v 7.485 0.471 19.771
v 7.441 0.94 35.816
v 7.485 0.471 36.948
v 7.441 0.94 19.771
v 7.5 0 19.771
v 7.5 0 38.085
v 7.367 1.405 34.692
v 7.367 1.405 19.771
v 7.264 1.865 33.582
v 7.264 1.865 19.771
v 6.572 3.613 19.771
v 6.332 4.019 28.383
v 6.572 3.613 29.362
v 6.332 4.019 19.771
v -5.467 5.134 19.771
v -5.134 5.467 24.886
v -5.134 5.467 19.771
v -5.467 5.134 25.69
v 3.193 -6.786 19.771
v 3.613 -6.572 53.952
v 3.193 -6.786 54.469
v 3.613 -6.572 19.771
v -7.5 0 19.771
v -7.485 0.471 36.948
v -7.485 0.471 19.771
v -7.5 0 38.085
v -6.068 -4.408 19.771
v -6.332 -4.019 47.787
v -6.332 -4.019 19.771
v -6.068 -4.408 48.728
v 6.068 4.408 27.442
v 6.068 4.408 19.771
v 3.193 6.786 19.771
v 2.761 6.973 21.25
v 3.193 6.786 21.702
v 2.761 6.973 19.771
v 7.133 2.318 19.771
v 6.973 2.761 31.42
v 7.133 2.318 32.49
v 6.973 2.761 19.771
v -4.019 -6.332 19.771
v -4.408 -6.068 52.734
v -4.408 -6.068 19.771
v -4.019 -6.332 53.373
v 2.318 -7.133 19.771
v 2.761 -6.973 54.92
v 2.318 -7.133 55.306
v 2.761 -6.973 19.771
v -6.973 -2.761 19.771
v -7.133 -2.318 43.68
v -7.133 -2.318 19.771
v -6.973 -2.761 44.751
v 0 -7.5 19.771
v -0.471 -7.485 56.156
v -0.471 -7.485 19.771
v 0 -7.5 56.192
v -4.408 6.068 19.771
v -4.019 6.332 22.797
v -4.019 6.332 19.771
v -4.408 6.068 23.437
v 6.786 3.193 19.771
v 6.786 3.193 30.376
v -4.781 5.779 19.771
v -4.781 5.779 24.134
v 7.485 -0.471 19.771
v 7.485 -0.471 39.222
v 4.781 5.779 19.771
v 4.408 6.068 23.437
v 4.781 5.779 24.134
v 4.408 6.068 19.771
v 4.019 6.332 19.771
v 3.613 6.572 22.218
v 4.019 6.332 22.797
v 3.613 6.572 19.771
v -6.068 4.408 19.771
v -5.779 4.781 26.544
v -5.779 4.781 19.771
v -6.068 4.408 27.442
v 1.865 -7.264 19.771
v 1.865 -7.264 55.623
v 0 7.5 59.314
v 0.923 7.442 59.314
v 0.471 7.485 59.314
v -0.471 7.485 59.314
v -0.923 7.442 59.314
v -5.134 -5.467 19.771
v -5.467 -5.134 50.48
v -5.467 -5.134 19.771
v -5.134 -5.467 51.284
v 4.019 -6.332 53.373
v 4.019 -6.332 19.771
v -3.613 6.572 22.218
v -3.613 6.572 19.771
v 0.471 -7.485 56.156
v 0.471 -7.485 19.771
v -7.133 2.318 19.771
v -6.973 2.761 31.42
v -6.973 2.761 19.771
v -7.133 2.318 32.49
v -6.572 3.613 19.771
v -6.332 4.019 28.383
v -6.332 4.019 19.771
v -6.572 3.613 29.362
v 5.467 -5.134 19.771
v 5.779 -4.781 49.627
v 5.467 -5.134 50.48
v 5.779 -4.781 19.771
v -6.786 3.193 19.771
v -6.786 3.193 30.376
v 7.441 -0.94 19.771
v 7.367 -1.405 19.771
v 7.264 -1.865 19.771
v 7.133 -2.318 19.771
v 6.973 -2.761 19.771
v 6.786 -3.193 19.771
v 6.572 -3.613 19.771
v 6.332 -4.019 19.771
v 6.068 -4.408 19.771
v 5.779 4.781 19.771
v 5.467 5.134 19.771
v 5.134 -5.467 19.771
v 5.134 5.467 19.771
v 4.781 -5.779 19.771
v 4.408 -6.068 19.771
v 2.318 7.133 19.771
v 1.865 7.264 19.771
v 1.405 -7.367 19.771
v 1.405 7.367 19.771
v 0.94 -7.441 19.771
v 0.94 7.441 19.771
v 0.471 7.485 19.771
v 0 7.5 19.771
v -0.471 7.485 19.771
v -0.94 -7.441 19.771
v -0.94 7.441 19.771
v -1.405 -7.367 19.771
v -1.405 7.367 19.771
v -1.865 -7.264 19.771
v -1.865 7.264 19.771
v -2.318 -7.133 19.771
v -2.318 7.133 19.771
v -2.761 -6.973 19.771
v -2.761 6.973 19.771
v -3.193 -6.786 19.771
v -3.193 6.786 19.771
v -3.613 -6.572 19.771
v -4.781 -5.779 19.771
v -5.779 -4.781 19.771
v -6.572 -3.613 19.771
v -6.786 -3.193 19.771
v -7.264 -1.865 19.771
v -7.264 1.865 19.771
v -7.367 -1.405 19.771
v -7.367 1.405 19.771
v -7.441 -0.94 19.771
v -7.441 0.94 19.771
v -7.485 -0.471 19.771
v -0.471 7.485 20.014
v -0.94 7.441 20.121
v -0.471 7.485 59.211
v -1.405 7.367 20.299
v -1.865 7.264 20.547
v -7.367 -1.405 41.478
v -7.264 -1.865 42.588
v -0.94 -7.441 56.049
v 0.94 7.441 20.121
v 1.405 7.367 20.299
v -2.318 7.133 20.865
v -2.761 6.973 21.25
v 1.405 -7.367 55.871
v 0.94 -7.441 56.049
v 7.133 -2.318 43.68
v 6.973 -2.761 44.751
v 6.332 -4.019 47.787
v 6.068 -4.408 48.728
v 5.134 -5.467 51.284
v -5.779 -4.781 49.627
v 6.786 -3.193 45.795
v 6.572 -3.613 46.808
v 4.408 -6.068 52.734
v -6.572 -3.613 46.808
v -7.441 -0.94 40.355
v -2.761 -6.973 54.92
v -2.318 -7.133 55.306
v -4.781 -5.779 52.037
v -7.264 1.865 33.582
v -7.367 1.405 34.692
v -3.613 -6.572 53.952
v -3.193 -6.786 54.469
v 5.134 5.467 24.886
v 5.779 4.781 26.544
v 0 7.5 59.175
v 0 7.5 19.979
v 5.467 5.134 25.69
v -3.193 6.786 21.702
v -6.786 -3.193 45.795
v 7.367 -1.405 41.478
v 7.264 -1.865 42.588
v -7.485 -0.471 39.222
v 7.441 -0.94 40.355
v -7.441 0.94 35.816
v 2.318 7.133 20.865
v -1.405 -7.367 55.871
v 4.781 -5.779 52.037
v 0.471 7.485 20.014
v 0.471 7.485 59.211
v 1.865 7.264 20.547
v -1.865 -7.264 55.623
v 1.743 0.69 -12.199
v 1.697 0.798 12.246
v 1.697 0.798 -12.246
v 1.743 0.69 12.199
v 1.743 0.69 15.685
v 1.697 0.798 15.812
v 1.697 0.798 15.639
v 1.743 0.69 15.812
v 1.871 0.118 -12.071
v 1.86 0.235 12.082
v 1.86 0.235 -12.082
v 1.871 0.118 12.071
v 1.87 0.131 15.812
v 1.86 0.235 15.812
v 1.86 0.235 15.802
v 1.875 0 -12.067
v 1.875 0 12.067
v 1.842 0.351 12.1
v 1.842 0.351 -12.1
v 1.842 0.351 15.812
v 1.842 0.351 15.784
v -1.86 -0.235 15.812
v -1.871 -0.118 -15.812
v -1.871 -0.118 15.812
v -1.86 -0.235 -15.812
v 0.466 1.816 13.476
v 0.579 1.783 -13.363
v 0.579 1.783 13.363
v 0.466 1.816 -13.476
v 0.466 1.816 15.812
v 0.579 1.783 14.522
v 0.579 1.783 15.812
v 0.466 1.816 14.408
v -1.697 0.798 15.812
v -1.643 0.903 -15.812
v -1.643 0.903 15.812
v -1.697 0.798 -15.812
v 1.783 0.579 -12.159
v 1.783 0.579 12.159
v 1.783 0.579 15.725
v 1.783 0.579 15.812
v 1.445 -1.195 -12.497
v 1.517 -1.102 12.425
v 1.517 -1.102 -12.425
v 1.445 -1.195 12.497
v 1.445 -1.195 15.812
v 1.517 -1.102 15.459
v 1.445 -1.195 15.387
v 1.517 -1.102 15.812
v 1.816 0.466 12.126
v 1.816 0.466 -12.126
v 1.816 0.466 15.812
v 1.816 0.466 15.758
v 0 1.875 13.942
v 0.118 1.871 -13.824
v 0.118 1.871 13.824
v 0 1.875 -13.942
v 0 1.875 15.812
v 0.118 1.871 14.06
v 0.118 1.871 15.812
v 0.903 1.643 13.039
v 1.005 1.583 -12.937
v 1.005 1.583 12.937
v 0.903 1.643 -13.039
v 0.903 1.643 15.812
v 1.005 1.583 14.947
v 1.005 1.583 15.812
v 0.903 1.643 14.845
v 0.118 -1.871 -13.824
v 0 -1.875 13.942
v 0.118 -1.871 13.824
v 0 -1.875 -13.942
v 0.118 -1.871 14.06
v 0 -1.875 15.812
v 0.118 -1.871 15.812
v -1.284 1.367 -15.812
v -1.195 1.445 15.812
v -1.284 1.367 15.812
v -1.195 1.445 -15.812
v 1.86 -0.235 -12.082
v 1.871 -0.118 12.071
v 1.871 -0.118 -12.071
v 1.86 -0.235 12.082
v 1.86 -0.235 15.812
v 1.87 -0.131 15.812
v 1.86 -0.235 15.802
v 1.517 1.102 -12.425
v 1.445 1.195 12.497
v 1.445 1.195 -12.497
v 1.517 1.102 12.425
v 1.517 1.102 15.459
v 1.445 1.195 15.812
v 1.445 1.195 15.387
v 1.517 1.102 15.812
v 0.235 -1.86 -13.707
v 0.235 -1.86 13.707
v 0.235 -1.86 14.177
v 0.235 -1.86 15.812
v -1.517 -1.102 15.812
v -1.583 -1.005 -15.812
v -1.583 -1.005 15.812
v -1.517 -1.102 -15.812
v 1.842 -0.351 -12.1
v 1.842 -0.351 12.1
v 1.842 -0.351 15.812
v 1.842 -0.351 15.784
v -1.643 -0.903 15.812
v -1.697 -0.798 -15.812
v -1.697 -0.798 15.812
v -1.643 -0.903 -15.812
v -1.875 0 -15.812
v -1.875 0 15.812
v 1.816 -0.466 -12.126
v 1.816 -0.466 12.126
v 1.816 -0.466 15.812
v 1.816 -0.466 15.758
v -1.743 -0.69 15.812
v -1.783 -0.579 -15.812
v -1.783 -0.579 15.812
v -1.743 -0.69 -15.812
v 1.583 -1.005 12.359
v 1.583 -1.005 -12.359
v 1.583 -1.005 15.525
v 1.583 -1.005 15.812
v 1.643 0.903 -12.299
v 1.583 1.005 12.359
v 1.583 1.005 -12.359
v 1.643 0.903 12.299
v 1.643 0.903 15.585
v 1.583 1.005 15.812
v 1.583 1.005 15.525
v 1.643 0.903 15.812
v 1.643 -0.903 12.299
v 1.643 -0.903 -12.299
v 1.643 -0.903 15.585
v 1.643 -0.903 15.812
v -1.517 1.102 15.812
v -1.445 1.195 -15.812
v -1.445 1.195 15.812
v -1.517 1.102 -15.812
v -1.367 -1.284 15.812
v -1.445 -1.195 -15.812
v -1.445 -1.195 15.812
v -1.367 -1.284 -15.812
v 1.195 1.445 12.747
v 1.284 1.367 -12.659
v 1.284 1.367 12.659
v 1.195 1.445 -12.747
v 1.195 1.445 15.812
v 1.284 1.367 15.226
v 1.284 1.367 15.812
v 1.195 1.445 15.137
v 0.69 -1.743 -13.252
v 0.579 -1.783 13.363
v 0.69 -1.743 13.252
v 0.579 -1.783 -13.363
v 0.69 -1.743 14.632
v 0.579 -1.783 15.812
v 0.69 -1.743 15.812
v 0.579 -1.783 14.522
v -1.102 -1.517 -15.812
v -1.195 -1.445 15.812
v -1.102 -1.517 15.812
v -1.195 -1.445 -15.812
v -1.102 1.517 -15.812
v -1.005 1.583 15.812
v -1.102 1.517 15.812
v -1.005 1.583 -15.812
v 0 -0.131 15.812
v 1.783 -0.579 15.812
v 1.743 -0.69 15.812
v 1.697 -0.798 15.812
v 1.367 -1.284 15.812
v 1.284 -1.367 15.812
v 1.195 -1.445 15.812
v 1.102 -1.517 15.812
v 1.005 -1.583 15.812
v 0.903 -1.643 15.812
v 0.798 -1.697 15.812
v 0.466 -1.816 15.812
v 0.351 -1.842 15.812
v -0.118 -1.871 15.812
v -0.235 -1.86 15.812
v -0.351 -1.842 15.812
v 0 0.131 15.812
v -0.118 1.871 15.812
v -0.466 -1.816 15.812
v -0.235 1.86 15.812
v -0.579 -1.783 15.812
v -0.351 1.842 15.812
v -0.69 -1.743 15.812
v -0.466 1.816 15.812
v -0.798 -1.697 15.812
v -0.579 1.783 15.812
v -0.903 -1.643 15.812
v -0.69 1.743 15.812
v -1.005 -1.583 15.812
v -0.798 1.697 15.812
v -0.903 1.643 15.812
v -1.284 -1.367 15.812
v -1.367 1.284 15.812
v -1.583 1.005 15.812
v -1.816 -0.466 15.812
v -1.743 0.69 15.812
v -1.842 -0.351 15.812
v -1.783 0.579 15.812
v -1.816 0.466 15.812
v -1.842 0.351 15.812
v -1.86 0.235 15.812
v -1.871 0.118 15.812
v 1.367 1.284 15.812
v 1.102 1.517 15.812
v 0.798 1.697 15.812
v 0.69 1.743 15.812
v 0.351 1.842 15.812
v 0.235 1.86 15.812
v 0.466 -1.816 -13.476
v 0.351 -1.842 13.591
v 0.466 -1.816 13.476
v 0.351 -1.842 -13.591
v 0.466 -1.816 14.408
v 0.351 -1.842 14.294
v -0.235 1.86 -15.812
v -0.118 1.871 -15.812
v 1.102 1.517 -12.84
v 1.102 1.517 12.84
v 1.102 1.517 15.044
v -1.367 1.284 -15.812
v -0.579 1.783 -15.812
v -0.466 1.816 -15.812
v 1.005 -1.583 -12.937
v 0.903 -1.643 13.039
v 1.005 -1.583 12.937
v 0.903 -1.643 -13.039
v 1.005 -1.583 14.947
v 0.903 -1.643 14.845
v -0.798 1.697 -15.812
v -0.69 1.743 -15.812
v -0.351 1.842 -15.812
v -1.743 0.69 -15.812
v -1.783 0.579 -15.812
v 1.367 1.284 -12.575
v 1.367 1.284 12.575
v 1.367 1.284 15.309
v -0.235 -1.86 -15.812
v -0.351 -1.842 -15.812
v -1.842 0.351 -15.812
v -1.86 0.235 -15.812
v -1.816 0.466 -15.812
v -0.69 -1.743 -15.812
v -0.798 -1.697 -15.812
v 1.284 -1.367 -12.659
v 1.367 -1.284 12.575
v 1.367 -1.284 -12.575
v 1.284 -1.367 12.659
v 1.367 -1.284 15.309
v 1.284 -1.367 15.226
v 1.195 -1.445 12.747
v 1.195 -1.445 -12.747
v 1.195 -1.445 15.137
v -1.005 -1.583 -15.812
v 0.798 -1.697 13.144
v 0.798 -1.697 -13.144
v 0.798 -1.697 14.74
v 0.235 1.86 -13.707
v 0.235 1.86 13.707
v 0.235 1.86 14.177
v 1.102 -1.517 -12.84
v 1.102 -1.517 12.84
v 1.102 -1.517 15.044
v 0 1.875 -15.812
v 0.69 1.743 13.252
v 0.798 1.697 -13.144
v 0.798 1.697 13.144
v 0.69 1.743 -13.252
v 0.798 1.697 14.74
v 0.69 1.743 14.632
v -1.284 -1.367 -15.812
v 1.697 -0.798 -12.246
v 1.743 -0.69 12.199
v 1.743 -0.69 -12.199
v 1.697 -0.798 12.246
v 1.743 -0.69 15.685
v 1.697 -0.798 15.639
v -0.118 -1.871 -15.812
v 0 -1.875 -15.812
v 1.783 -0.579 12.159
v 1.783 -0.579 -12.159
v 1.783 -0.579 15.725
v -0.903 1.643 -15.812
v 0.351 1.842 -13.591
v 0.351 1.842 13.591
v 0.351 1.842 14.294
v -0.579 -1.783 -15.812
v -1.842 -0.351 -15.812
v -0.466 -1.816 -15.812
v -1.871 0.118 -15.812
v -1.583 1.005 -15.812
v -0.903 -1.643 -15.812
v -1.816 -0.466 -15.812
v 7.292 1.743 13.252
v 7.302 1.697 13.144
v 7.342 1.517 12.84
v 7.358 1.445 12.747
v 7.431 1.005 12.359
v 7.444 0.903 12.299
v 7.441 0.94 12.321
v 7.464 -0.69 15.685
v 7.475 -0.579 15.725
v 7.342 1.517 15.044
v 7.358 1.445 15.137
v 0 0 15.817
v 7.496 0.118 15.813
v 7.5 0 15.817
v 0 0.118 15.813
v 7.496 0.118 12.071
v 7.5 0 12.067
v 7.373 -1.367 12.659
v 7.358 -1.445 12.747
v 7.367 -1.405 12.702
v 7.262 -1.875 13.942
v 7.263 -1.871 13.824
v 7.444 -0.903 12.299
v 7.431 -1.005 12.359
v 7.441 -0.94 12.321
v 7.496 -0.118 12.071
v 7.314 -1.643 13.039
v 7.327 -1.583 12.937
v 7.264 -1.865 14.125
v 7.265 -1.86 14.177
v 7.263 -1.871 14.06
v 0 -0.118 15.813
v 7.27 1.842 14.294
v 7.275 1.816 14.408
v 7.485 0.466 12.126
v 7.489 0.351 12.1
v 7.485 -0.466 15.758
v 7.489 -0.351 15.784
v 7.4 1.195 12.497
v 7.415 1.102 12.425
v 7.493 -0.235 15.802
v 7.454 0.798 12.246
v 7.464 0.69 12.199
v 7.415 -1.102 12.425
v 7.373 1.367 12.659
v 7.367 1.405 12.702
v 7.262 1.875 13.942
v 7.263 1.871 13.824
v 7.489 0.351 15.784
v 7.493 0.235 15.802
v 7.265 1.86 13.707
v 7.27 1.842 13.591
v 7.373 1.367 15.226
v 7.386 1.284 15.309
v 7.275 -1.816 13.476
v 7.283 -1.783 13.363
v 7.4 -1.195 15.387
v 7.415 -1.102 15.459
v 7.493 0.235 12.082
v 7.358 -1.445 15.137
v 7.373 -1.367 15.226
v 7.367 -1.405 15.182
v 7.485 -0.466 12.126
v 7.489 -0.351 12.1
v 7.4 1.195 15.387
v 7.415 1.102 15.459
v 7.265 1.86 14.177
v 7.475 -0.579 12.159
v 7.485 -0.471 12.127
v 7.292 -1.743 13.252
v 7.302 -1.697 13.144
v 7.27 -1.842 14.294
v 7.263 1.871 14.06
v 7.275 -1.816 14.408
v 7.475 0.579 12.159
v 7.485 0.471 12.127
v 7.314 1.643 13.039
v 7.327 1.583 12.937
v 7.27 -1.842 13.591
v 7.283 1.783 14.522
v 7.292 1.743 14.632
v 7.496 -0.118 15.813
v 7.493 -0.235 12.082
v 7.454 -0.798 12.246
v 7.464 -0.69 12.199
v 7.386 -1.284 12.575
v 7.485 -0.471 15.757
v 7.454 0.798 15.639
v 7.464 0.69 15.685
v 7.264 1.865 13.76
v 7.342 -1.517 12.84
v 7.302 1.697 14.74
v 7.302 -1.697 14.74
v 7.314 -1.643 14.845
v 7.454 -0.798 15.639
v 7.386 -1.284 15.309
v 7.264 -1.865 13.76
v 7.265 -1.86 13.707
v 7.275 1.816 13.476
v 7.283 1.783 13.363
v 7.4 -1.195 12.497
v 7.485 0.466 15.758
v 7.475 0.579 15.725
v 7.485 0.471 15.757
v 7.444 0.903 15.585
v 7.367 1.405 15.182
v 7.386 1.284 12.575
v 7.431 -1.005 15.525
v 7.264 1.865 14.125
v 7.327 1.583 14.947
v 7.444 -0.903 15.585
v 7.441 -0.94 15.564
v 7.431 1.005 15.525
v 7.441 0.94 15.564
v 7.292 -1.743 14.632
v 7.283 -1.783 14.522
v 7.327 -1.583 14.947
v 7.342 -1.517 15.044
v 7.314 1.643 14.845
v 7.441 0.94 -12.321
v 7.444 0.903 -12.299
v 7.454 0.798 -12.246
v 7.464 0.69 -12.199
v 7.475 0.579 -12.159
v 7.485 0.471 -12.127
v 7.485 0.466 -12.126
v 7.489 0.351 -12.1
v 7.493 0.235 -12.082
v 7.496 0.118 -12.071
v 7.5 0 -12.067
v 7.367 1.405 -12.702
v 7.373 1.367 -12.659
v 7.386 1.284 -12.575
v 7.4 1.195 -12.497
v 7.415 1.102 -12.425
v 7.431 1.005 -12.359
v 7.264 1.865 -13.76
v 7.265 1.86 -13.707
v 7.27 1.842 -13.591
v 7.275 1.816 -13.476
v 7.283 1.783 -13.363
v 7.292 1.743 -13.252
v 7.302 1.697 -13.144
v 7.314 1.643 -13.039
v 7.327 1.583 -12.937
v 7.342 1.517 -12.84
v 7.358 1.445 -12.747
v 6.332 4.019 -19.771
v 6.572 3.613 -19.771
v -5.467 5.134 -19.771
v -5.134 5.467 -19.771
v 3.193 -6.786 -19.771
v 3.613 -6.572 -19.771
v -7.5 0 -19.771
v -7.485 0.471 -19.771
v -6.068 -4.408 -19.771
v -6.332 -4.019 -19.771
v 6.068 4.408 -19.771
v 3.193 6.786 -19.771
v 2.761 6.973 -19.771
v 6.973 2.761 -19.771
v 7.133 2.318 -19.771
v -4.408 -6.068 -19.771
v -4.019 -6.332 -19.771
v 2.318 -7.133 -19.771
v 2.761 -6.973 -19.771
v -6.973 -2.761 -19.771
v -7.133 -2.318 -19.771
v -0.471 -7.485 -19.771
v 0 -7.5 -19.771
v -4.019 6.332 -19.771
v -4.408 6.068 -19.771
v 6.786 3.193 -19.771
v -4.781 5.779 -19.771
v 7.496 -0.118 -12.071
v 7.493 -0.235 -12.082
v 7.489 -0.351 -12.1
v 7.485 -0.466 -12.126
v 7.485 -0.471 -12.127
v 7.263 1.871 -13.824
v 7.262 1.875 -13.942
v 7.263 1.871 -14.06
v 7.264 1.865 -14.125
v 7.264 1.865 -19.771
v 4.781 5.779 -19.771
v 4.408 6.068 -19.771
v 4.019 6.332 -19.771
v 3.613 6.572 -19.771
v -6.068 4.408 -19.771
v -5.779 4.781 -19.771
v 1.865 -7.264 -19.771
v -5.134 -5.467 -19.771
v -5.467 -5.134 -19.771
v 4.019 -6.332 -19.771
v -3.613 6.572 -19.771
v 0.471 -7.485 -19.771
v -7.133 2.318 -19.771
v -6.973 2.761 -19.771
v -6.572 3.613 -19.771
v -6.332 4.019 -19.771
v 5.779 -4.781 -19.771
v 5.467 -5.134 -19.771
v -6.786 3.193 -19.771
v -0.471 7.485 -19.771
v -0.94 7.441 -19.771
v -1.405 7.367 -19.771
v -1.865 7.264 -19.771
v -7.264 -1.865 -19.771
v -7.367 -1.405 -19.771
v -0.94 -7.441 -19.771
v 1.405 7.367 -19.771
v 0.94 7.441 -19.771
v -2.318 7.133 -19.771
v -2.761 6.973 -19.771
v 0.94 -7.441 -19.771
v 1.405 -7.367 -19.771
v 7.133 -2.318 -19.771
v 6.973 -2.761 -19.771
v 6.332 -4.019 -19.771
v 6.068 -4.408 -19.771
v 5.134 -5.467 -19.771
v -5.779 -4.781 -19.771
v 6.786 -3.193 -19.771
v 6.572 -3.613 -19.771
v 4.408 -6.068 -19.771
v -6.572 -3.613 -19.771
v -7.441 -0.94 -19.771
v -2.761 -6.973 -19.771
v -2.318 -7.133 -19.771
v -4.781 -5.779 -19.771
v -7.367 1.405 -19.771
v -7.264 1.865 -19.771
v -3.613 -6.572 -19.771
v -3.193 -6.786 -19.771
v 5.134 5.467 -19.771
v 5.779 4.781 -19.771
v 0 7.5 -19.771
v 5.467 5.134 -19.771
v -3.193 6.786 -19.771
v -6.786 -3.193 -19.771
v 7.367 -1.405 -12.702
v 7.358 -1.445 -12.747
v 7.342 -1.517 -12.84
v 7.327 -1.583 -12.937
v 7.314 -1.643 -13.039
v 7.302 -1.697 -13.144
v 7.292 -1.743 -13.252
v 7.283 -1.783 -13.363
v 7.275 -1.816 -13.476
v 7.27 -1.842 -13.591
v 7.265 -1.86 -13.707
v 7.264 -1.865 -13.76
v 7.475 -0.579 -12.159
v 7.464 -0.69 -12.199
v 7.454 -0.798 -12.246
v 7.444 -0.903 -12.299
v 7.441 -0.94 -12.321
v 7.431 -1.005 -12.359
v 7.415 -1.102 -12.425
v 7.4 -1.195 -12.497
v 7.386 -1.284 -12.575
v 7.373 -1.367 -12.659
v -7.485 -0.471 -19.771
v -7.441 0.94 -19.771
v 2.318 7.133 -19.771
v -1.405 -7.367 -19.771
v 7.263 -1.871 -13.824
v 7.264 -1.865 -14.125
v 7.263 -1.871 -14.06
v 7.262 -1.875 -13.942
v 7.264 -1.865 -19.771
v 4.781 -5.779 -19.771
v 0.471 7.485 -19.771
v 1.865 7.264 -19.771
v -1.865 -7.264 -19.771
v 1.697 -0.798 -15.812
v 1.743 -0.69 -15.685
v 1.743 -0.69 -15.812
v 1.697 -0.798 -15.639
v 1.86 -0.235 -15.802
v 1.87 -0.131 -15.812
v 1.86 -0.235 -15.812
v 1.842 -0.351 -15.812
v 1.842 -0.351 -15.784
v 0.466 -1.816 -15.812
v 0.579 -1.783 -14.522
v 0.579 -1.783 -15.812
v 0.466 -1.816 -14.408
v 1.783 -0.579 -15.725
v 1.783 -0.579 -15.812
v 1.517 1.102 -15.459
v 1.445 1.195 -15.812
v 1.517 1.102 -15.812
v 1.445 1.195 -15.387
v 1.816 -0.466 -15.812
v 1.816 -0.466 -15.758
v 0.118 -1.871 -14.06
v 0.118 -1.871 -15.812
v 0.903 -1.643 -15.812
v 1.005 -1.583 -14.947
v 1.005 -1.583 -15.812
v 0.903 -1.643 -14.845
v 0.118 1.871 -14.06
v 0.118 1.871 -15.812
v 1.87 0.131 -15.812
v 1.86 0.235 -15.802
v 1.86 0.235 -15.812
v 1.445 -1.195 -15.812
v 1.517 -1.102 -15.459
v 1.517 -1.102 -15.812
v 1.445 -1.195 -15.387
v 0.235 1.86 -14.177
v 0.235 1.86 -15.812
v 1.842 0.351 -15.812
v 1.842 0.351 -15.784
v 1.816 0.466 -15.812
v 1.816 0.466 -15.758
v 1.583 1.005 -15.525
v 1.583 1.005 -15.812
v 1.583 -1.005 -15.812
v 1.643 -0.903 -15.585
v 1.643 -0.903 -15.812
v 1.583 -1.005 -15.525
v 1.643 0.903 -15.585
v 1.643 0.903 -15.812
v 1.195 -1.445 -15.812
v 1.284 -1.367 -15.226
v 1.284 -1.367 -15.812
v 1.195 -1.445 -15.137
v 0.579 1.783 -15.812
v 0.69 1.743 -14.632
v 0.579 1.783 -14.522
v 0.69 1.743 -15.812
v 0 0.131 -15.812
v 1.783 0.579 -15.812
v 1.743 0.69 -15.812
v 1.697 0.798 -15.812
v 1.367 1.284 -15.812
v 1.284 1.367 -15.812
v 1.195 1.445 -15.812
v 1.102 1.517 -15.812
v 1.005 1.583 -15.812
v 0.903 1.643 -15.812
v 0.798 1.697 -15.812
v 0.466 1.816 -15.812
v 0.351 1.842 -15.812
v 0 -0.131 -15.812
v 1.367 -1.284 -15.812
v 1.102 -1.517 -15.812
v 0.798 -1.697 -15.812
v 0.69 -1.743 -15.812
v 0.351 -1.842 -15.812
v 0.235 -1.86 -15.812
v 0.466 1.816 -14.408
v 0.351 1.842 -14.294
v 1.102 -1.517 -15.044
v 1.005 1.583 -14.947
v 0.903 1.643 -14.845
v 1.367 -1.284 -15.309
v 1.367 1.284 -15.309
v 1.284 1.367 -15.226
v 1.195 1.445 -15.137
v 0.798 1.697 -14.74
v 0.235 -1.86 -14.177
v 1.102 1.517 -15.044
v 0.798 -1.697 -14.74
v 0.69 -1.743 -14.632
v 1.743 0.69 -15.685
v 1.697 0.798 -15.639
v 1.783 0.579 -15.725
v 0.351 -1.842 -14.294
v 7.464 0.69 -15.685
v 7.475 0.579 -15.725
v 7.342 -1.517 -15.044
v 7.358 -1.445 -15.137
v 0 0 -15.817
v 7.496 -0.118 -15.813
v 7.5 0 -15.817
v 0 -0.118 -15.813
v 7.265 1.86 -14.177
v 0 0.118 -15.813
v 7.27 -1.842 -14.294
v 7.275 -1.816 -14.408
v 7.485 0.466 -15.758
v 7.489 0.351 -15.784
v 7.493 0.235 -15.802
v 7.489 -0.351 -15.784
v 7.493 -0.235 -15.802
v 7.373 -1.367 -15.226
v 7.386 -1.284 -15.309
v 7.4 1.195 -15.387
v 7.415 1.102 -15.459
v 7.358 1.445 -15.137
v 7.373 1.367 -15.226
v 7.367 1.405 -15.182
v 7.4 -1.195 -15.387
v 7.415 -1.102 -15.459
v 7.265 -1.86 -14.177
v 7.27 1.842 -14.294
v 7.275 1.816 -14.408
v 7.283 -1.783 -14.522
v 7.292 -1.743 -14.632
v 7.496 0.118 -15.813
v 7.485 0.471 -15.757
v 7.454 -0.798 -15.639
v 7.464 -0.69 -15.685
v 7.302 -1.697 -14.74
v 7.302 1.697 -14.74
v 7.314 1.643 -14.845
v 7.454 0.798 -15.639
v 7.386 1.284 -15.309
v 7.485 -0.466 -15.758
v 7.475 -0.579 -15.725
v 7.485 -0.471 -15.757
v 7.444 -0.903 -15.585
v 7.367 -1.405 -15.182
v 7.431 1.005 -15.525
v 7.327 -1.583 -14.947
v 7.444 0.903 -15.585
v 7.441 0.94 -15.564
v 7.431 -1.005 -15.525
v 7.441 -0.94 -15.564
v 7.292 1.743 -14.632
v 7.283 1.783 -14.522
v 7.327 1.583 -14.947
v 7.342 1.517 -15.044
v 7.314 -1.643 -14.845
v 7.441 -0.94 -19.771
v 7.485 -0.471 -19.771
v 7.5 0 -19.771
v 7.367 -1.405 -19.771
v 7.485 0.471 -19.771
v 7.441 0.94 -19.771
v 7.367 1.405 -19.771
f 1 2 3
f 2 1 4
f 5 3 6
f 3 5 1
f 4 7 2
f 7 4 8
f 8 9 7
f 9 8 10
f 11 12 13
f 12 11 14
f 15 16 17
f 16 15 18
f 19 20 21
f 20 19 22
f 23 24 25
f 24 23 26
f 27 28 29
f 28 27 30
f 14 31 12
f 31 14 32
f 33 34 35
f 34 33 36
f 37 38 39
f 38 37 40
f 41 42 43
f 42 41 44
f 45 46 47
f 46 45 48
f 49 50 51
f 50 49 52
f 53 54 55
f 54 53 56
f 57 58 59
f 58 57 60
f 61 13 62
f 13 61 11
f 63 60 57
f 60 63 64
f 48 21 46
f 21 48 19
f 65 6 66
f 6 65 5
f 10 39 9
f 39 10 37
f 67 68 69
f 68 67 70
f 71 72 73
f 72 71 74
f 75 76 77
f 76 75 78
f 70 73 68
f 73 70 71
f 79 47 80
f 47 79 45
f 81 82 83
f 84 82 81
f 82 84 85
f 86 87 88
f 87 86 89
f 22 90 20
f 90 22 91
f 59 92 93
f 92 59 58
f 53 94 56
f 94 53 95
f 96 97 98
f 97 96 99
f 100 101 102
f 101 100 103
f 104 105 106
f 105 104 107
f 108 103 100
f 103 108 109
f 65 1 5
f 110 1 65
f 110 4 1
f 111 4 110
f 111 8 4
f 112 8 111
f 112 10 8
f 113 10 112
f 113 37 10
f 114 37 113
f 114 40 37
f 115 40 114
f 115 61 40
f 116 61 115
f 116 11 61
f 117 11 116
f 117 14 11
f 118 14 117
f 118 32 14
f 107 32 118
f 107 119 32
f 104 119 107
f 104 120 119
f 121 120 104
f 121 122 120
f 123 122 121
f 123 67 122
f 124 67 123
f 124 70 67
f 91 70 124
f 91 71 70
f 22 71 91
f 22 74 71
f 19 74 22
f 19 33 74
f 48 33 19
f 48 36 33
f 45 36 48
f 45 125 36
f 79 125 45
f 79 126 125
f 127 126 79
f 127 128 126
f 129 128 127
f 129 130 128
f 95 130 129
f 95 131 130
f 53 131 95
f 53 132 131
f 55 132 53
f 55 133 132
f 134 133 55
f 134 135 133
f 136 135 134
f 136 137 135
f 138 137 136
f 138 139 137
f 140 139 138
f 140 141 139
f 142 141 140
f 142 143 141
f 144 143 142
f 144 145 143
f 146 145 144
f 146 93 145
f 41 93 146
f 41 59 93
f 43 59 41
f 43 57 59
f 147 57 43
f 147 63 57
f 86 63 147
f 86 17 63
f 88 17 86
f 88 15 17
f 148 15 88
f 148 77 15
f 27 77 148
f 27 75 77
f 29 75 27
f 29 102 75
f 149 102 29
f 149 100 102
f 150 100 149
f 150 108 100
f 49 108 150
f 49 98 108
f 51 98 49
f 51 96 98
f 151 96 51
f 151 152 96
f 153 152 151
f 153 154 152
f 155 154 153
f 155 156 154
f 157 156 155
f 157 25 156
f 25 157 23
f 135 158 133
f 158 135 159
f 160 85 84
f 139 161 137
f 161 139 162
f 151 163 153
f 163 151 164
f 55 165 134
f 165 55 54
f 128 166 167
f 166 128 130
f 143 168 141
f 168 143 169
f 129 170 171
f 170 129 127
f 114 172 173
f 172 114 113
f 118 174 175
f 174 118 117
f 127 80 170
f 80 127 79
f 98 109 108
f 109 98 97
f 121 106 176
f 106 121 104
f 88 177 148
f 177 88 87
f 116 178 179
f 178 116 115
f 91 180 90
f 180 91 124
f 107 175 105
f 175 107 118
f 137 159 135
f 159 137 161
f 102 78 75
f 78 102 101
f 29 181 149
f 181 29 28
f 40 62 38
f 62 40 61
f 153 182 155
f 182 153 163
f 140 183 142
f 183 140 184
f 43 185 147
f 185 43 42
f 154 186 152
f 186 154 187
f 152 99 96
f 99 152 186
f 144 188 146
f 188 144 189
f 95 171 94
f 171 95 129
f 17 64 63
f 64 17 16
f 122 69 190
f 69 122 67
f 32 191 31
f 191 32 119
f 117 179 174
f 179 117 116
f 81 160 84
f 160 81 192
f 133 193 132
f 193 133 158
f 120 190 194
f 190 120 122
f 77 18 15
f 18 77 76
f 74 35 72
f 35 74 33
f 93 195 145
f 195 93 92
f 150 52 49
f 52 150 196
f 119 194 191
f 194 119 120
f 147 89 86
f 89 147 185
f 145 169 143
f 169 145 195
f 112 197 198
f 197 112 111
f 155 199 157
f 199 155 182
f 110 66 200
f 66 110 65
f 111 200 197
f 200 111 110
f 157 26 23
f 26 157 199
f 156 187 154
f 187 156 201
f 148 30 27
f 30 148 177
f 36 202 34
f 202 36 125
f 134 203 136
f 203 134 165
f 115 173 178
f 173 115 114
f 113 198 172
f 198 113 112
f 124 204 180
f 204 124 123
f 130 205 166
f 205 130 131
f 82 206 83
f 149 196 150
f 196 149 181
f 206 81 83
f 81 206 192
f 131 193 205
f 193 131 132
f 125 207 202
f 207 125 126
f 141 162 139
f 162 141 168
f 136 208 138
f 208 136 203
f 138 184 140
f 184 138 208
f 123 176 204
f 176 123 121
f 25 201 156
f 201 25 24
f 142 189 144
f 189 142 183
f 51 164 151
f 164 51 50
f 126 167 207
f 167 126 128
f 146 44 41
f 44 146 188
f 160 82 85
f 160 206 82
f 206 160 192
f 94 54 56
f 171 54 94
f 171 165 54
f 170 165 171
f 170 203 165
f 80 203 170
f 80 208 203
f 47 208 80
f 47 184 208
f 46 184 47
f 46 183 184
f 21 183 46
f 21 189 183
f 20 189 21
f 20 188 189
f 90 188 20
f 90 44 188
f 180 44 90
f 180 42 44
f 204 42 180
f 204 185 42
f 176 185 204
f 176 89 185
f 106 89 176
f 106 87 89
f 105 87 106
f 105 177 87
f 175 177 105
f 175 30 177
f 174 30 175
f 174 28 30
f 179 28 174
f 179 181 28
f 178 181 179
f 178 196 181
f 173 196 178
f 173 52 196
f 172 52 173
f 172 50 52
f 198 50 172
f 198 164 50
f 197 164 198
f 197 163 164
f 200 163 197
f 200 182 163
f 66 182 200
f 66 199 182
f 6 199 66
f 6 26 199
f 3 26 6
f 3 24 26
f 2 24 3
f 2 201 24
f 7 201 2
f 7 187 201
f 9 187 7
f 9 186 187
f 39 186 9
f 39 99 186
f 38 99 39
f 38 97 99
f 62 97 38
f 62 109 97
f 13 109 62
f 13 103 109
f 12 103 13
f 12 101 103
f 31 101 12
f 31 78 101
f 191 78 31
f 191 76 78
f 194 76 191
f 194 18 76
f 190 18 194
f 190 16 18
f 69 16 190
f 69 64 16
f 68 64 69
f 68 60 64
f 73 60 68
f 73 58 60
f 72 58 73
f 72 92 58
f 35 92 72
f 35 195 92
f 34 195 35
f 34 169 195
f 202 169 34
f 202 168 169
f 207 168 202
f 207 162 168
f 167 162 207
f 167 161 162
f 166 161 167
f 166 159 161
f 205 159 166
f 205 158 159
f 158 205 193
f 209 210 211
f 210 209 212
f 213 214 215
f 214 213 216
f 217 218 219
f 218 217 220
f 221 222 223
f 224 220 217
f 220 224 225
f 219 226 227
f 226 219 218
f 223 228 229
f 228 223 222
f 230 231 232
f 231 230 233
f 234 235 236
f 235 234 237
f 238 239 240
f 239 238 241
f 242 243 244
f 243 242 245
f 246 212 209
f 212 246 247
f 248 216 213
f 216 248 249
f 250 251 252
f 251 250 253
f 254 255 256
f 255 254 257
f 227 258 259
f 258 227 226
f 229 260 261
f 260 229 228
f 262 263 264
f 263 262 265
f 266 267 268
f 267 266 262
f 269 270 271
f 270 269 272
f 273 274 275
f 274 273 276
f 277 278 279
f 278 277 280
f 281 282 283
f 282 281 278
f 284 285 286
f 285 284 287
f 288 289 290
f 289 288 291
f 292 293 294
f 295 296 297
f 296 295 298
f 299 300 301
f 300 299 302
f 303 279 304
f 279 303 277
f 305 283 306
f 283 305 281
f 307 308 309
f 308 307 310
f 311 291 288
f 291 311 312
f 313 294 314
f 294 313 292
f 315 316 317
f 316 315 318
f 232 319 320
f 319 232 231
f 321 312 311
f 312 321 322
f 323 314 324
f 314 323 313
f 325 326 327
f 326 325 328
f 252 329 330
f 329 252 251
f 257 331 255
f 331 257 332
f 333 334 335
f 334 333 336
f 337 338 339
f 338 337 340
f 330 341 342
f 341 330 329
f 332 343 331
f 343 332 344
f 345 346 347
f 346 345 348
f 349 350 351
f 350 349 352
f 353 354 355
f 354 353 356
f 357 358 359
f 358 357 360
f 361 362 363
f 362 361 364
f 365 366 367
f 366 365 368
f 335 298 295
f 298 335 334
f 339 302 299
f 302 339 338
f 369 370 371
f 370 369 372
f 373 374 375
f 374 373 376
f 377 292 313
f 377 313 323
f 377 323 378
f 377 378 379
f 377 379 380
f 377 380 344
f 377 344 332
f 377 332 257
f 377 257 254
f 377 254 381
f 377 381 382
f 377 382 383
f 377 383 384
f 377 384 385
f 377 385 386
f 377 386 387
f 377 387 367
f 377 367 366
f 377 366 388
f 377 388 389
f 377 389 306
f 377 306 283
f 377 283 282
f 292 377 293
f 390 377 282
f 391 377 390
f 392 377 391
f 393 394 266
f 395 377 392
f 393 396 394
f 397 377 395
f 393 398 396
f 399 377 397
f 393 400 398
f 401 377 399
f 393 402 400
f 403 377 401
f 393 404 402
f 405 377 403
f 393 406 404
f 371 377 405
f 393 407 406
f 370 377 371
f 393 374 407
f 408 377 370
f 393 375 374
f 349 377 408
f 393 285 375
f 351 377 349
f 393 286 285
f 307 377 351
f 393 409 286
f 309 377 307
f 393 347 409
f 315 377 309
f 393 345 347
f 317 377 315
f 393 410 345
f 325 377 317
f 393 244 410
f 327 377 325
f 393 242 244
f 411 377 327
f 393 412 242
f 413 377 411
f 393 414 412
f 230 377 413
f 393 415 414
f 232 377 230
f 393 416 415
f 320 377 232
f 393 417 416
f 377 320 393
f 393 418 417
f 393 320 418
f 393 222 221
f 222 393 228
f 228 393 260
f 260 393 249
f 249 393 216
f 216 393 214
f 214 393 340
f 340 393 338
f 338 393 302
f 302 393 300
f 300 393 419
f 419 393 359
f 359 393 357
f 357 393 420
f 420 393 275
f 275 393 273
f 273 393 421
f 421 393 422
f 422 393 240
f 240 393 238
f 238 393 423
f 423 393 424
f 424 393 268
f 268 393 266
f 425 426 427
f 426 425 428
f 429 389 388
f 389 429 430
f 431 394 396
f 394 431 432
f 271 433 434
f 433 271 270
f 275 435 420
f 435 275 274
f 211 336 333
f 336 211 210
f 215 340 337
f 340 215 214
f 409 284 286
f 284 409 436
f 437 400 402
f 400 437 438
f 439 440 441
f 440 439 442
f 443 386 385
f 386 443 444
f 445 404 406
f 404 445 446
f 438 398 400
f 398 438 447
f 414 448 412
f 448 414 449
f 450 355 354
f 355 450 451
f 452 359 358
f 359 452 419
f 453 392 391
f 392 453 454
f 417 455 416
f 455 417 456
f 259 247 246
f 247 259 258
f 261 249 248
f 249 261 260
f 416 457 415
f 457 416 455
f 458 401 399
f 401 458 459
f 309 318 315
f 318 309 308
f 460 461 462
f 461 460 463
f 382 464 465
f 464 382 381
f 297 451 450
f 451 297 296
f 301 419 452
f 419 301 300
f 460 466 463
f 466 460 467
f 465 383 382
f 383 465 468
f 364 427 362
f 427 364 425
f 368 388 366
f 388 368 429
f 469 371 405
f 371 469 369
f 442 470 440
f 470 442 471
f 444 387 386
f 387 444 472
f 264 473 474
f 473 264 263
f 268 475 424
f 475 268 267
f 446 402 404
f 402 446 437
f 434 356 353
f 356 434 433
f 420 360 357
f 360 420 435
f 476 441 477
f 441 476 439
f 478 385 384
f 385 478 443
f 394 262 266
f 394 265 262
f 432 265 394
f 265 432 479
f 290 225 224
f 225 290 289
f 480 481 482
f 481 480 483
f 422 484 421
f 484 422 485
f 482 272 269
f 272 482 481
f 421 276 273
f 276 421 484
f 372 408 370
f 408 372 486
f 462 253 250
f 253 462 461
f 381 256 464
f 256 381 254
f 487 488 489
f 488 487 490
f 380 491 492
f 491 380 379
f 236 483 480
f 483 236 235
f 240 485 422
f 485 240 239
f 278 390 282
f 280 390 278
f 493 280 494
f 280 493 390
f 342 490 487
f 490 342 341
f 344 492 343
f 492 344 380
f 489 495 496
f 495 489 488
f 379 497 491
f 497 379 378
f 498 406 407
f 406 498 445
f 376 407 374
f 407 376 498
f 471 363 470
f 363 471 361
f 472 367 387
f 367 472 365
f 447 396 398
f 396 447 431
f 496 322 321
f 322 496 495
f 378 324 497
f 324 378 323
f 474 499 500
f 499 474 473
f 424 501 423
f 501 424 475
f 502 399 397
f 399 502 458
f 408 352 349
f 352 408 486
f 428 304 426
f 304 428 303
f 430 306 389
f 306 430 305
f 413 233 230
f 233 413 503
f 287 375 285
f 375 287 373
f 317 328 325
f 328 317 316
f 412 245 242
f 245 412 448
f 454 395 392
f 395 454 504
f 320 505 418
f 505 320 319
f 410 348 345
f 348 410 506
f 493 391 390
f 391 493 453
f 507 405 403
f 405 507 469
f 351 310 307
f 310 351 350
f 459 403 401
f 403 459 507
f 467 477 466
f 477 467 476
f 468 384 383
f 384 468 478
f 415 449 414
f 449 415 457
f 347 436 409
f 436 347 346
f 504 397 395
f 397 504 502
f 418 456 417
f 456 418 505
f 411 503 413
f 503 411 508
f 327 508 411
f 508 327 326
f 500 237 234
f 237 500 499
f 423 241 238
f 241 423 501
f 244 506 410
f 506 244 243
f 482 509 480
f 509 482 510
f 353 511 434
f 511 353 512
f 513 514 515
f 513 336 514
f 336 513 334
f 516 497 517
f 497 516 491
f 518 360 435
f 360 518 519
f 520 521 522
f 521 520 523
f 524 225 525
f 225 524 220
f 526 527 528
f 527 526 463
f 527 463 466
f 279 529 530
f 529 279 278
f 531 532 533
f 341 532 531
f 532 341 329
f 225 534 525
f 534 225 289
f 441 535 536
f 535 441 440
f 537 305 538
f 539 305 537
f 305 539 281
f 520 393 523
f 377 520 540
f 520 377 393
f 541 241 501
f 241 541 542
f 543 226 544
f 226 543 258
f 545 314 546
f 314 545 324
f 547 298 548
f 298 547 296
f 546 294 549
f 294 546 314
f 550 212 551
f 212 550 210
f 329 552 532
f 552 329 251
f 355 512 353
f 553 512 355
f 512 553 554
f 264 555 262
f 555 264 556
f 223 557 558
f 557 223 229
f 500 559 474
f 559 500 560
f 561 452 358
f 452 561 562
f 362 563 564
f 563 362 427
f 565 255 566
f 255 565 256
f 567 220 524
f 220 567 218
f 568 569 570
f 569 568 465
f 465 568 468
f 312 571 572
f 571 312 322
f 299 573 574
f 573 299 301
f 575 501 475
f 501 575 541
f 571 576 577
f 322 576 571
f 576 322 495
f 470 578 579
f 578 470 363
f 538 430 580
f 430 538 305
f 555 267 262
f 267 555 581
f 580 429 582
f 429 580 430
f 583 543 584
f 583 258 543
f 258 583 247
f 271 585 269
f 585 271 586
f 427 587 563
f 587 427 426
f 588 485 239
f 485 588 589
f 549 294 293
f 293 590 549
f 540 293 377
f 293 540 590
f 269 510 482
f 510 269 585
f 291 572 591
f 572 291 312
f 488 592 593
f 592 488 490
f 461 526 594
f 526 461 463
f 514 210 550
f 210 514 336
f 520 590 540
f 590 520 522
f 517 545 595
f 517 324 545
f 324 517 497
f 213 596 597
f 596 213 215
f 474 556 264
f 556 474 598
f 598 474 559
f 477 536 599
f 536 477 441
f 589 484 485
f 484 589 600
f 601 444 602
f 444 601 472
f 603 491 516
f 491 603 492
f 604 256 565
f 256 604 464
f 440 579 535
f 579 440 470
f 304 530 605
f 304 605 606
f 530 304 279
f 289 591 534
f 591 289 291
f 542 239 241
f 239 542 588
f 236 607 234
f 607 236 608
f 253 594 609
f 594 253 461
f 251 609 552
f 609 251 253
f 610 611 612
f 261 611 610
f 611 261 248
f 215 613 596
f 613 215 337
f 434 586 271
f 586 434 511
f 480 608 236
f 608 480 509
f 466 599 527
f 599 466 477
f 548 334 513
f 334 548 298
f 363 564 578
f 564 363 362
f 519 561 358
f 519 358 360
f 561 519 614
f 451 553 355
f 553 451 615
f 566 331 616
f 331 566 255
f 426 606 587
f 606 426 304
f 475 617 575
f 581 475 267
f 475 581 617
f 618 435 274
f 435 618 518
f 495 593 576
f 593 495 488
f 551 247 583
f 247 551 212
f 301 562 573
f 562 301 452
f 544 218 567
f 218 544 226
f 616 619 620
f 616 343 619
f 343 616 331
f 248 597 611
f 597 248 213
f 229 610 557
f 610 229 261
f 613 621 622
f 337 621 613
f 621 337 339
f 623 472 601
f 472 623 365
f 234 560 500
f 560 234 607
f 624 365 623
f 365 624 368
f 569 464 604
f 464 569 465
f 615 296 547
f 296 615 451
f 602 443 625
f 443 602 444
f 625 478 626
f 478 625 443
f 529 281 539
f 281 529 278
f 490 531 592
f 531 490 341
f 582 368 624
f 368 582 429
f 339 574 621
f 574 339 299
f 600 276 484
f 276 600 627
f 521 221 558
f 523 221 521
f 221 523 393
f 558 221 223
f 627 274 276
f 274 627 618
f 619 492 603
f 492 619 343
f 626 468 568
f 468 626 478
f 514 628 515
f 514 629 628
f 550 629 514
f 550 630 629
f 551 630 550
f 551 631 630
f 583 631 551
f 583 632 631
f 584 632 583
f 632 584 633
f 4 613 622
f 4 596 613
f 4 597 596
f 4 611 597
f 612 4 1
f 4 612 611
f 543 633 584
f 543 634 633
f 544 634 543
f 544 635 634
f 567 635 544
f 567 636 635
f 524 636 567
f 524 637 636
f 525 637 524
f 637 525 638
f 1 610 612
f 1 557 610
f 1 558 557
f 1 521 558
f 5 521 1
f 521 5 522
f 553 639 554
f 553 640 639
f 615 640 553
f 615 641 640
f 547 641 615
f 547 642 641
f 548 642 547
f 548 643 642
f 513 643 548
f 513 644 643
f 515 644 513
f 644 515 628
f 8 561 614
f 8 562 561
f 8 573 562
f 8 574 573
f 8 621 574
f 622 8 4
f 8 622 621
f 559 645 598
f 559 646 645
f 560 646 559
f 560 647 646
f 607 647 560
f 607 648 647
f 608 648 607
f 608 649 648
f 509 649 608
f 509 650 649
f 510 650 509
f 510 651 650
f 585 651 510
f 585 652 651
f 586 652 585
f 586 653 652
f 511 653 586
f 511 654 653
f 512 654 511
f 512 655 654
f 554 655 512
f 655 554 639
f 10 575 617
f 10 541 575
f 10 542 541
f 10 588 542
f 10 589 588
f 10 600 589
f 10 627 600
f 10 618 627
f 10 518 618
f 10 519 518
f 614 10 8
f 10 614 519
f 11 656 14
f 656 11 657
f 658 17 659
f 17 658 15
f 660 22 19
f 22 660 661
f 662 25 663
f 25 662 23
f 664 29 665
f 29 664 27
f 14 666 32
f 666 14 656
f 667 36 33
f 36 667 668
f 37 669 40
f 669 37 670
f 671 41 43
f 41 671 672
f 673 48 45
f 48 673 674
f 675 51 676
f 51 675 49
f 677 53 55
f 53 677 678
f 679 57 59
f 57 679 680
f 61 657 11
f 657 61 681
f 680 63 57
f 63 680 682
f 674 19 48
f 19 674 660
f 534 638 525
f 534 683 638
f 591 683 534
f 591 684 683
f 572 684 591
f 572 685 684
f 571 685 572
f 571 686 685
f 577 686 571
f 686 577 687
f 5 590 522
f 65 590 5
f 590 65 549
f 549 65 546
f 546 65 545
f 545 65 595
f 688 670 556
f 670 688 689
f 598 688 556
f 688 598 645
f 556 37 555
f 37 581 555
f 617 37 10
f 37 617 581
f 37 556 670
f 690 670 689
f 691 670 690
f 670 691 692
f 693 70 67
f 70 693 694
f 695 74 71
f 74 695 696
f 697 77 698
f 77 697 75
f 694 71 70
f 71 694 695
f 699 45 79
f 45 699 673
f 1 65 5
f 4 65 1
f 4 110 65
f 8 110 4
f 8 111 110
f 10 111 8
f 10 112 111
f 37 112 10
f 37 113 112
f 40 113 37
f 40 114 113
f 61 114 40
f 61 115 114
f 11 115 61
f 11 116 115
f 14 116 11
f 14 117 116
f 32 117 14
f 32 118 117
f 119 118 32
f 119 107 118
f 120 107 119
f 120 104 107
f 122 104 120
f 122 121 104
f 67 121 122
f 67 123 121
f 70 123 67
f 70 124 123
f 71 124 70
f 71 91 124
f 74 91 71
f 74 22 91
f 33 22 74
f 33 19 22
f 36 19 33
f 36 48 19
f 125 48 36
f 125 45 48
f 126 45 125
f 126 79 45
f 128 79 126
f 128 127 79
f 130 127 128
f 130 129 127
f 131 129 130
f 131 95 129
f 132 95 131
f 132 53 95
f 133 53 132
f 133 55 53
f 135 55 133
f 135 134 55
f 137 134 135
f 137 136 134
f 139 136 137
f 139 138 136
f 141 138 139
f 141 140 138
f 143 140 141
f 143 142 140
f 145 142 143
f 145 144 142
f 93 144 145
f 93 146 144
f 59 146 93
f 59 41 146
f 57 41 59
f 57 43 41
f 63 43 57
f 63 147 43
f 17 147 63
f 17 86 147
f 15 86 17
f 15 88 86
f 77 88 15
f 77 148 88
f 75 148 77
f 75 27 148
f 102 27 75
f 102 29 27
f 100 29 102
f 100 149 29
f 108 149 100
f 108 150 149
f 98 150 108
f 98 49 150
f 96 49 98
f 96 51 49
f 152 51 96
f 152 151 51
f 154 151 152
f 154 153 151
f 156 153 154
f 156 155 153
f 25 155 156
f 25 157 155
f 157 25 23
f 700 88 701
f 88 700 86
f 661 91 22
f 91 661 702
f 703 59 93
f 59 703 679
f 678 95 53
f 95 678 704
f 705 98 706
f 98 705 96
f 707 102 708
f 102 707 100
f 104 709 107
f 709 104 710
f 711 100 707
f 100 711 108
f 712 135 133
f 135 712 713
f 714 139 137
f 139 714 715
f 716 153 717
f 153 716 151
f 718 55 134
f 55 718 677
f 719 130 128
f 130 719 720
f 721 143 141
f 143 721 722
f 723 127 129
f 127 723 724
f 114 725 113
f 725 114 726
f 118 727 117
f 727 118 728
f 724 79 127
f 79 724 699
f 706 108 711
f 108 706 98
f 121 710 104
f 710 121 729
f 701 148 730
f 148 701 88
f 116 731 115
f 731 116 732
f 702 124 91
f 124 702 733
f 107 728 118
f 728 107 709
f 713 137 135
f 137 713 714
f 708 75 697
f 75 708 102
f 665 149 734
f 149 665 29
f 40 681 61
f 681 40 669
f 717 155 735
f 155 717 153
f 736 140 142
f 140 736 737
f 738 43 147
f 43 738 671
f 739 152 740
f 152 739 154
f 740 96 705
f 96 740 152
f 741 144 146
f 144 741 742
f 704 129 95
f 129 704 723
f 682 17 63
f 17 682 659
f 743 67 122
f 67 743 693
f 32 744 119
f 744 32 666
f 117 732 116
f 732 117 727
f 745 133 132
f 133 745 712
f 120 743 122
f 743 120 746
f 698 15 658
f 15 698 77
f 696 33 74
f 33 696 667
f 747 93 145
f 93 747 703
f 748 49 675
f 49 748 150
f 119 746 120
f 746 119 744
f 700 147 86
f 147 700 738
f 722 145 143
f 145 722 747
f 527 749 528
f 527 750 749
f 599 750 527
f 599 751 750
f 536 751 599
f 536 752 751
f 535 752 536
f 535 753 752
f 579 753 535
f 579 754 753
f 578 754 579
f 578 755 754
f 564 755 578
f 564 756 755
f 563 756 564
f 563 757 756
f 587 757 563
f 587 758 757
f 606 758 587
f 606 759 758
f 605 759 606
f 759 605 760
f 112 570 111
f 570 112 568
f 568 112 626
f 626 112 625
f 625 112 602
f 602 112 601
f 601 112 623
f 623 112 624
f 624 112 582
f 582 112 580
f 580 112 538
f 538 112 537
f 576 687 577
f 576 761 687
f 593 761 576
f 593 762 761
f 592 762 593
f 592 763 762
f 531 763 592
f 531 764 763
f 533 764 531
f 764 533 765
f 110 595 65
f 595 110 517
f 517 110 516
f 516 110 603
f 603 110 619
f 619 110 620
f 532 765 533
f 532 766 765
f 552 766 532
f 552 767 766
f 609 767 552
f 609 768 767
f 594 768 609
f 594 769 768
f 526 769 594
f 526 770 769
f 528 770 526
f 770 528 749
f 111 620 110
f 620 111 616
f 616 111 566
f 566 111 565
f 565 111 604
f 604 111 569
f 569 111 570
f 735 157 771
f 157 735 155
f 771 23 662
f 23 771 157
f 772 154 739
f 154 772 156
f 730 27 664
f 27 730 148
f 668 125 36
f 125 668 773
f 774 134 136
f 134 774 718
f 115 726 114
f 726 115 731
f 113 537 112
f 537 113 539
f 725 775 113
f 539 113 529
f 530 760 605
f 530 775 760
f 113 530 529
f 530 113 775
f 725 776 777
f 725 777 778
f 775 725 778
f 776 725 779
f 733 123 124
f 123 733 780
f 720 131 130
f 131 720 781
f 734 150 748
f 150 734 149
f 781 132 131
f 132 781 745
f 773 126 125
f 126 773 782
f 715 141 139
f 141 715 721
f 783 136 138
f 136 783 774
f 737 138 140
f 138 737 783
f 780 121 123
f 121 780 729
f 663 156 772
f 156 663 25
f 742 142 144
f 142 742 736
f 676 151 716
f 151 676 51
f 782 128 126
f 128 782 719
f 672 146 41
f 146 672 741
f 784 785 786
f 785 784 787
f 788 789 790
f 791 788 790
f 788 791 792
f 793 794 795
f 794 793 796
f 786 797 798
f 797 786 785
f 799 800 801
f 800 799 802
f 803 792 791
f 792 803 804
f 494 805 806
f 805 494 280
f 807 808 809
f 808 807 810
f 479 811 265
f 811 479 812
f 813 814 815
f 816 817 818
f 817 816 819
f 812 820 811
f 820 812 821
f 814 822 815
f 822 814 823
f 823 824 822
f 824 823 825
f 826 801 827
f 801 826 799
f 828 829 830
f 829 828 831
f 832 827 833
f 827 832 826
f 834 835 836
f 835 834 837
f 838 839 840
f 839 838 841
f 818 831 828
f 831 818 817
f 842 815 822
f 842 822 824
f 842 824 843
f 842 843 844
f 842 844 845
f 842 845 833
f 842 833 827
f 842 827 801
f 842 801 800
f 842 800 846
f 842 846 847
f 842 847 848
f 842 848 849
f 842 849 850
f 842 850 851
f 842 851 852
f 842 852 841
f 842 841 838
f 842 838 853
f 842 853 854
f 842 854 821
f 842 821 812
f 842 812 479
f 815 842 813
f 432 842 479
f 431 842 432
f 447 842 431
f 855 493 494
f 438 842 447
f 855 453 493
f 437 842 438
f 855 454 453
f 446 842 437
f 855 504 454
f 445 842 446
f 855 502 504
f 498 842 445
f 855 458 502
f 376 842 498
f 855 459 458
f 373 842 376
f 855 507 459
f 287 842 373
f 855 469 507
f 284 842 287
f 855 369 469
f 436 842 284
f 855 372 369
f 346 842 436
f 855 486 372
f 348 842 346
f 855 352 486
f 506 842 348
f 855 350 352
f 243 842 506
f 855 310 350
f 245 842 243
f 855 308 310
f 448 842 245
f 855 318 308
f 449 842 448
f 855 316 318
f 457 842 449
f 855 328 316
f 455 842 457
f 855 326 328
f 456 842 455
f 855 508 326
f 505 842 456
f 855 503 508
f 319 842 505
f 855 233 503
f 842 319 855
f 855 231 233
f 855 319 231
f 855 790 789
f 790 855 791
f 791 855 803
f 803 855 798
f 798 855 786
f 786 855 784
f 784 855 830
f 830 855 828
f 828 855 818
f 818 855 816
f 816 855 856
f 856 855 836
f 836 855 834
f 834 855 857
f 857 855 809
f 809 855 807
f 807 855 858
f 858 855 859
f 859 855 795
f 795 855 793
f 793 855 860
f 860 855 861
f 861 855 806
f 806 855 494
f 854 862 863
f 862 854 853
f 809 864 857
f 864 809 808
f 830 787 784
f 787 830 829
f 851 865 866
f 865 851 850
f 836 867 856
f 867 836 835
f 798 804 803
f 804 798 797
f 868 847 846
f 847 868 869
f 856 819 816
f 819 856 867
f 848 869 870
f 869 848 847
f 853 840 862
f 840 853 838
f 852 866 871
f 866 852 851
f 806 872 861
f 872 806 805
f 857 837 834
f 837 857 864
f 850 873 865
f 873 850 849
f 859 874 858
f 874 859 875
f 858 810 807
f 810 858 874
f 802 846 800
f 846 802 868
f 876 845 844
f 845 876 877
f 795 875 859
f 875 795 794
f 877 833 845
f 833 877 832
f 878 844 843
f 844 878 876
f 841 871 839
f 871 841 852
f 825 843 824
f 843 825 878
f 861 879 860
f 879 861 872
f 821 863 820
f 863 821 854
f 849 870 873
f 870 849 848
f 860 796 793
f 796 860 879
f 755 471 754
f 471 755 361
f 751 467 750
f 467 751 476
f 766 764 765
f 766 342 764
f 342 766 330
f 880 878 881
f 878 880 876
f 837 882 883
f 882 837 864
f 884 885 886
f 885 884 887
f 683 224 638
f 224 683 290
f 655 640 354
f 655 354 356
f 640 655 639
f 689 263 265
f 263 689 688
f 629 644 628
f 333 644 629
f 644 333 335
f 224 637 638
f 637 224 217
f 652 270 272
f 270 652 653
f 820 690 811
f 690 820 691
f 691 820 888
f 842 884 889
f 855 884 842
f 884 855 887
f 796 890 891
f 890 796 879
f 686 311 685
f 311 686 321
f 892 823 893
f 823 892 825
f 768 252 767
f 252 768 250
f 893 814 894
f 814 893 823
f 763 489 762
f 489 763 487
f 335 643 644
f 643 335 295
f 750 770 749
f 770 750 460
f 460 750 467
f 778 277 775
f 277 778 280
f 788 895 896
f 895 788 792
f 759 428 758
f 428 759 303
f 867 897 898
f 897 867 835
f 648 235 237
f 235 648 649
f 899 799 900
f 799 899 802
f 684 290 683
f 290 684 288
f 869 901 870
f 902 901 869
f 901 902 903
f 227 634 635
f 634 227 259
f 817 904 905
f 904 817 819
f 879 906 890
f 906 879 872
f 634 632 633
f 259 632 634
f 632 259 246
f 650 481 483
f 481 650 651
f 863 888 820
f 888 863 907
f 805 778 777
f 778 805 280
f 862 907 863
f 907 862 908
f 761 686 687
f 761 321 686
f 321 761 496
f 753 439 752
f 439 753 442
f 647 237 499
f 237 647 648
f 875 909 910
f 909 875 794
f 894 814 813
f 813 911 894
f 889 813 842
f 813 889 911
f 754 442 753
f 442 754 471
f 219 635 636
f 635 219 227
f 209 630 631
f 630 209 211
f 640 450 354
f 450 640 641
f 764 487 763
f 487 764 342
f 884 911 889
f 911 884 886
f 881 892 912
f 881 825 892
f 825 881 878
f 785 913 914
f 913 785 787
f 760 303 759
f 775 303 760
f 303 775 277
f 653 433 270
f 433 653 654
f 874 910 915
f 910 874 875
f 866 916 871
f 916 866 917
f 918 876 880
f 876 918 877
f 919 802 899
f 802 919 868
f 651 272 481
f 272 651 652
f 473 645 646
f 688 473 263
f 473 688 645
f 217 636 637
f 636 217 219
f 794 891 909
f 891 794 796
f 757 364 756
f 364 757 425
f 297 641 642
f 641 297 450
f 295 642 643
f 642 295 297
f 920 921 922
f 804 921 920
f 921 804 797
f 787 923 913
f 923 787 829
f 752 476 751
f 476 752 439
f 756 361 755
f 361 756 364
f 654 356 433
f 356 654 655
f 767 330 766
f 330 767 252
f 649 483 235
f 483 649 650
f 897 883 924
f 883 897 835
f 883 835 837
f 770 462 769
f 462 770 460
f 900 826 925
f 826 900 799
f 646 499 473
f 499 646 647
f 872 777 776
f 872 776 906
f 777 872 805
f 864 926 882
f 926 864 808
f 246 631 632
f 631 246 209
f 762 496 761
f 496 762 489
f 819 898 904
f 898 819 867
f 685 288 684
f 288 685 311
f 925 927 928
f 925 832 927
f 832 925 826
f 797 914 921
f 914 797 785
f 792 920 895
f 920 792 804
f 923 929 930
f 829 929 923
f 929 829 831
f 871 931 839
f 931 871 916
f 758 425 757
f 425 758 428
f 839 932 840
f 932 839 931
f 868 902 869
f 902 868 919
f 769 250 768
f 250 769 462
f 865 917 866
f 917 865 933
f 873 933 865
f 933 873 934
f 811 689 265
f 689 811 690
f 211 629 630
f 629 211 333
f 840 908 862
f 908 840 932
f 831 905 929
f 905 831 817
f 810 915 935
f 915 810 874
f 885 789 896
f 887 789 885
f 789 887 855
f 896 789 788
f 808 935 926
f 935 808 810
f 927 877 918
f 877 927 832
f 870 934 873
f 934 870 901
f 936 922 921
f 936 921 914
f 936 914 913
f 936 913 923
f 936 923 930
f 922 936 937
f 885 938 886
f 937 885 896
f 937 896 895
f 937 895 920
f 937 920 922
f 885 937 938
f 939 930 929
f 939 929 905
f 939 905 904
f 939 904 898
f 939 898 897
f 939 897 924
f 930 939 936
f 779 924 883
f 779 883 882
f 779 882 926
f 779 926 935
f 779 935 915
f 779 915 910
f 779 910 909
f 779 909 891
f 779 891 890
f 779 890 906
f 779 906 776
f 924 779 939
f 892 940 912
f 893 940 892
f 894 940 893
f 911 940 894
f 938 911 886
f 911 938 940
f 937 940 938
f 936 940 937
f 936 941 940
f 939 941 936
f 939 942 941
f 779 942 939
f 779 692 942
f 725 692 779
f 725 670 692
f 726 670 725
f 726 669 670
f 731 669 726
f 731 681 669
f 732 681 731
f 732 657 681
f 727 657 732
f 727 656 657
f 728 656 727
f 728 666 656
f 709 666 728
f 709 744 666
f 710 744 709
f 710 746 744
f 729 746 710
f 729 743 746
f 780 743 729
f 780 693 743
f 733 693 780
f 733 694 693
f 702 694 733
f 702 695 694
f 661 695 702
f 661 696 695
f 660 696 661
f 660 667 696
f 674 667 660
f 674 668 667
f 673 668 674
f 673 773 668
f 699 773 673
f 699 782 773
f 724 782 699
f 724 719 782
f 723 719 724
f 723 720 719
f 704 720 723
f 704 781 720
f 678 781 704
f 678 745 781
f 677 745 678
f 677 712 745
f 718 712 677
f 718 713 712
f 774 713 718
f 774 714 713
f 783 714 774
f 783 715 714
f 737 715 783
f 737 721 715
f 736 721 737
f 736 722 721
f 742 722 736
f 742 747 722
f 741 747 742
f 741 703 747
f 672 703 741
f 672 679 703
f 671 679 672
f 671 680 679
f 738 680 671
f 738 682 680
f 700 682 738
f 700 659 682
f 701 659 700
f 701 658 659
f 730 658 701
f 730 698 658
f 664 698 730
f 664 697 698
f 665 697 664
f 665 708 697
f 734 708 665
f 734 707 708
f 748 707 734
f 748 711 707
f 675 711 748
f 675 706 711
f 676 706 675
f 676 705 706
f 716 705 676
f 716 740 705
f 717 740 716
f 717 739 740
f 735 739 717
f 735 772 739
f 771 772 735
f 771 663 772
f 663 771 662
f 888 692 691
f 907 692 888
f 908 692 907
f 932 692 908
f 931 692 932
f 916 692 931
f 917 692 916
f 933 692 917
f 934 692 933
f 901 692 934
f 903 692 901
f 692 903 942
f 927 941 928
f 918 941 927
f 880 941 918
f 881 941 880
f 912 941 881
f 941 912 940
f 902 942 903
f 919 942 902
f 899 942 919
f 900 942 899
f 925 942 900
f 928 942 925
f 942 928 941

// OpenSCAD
resolution=100;

shape_tube_d=30;

puncture_tube_d=shape_tube_d/2;
puncture_tube_r=puncture_tube_d/2;
puncture_tube_h=5+puncture_tube_r/tan(12.25);

venturi_r=puncture_tube_r/4;
venturi_h=puncture_tube_h/2.5;

tube_tube_r=puncture_tube_r;
tube_tube_h=puncture_tube_h/2;

echo (puncture_tube_r, puncture_tube_h);

//S=o/h
//c=a/h
//t=o/a
//a=o/t

difference() {
//	cylinder(r=2*puncture_tube_r, h=2*puncture_tube_h, $fn=resolution);

	union(){
#		translate([0,0,tube_tube_h])
			difference(){
				cylinder( r=puncture_tube_r, h=puncture_tube_h, $fn=resolution);
				translate([puncture_tube_d/-2,8,-1])
					rotate([45/2,0,0])
						cube([puncture_tube_d,puncture_tube_d,100]);
			}
			difference() {
				cylinder(r=tube_tube_r, h=tube_tube_h, $fn=resolution);
				union(){
					translate([0,0,-0.005])
						cylinder(r=venturi_r, h=venturi_h, $fn=resolution);
					translate([0,0,venturi_h-venturi_r])
						rotate([0,90,0])
							cylinder(r=venturi_r, h=venturi_h, $fn=resolution);
				}
			}
				
			 rotate([0,180,180])
			difference()  {
				cylinder(r=tube_tube_r, h=tube_tube_h, $fn=resolution);
				union(){
					translate([0,0,-0.005])
						cylinder(r=venturi_r, h=venturi_h, $fn=resolution);
					translate([0,0,venturi_h-venturi_r])
						rotate([0,90,0])
							cylinder(r=venturi_r, h=venturi_h, $fn=resolution);
				}
			}
		
	}	// end difference union
}	// end outer difference
